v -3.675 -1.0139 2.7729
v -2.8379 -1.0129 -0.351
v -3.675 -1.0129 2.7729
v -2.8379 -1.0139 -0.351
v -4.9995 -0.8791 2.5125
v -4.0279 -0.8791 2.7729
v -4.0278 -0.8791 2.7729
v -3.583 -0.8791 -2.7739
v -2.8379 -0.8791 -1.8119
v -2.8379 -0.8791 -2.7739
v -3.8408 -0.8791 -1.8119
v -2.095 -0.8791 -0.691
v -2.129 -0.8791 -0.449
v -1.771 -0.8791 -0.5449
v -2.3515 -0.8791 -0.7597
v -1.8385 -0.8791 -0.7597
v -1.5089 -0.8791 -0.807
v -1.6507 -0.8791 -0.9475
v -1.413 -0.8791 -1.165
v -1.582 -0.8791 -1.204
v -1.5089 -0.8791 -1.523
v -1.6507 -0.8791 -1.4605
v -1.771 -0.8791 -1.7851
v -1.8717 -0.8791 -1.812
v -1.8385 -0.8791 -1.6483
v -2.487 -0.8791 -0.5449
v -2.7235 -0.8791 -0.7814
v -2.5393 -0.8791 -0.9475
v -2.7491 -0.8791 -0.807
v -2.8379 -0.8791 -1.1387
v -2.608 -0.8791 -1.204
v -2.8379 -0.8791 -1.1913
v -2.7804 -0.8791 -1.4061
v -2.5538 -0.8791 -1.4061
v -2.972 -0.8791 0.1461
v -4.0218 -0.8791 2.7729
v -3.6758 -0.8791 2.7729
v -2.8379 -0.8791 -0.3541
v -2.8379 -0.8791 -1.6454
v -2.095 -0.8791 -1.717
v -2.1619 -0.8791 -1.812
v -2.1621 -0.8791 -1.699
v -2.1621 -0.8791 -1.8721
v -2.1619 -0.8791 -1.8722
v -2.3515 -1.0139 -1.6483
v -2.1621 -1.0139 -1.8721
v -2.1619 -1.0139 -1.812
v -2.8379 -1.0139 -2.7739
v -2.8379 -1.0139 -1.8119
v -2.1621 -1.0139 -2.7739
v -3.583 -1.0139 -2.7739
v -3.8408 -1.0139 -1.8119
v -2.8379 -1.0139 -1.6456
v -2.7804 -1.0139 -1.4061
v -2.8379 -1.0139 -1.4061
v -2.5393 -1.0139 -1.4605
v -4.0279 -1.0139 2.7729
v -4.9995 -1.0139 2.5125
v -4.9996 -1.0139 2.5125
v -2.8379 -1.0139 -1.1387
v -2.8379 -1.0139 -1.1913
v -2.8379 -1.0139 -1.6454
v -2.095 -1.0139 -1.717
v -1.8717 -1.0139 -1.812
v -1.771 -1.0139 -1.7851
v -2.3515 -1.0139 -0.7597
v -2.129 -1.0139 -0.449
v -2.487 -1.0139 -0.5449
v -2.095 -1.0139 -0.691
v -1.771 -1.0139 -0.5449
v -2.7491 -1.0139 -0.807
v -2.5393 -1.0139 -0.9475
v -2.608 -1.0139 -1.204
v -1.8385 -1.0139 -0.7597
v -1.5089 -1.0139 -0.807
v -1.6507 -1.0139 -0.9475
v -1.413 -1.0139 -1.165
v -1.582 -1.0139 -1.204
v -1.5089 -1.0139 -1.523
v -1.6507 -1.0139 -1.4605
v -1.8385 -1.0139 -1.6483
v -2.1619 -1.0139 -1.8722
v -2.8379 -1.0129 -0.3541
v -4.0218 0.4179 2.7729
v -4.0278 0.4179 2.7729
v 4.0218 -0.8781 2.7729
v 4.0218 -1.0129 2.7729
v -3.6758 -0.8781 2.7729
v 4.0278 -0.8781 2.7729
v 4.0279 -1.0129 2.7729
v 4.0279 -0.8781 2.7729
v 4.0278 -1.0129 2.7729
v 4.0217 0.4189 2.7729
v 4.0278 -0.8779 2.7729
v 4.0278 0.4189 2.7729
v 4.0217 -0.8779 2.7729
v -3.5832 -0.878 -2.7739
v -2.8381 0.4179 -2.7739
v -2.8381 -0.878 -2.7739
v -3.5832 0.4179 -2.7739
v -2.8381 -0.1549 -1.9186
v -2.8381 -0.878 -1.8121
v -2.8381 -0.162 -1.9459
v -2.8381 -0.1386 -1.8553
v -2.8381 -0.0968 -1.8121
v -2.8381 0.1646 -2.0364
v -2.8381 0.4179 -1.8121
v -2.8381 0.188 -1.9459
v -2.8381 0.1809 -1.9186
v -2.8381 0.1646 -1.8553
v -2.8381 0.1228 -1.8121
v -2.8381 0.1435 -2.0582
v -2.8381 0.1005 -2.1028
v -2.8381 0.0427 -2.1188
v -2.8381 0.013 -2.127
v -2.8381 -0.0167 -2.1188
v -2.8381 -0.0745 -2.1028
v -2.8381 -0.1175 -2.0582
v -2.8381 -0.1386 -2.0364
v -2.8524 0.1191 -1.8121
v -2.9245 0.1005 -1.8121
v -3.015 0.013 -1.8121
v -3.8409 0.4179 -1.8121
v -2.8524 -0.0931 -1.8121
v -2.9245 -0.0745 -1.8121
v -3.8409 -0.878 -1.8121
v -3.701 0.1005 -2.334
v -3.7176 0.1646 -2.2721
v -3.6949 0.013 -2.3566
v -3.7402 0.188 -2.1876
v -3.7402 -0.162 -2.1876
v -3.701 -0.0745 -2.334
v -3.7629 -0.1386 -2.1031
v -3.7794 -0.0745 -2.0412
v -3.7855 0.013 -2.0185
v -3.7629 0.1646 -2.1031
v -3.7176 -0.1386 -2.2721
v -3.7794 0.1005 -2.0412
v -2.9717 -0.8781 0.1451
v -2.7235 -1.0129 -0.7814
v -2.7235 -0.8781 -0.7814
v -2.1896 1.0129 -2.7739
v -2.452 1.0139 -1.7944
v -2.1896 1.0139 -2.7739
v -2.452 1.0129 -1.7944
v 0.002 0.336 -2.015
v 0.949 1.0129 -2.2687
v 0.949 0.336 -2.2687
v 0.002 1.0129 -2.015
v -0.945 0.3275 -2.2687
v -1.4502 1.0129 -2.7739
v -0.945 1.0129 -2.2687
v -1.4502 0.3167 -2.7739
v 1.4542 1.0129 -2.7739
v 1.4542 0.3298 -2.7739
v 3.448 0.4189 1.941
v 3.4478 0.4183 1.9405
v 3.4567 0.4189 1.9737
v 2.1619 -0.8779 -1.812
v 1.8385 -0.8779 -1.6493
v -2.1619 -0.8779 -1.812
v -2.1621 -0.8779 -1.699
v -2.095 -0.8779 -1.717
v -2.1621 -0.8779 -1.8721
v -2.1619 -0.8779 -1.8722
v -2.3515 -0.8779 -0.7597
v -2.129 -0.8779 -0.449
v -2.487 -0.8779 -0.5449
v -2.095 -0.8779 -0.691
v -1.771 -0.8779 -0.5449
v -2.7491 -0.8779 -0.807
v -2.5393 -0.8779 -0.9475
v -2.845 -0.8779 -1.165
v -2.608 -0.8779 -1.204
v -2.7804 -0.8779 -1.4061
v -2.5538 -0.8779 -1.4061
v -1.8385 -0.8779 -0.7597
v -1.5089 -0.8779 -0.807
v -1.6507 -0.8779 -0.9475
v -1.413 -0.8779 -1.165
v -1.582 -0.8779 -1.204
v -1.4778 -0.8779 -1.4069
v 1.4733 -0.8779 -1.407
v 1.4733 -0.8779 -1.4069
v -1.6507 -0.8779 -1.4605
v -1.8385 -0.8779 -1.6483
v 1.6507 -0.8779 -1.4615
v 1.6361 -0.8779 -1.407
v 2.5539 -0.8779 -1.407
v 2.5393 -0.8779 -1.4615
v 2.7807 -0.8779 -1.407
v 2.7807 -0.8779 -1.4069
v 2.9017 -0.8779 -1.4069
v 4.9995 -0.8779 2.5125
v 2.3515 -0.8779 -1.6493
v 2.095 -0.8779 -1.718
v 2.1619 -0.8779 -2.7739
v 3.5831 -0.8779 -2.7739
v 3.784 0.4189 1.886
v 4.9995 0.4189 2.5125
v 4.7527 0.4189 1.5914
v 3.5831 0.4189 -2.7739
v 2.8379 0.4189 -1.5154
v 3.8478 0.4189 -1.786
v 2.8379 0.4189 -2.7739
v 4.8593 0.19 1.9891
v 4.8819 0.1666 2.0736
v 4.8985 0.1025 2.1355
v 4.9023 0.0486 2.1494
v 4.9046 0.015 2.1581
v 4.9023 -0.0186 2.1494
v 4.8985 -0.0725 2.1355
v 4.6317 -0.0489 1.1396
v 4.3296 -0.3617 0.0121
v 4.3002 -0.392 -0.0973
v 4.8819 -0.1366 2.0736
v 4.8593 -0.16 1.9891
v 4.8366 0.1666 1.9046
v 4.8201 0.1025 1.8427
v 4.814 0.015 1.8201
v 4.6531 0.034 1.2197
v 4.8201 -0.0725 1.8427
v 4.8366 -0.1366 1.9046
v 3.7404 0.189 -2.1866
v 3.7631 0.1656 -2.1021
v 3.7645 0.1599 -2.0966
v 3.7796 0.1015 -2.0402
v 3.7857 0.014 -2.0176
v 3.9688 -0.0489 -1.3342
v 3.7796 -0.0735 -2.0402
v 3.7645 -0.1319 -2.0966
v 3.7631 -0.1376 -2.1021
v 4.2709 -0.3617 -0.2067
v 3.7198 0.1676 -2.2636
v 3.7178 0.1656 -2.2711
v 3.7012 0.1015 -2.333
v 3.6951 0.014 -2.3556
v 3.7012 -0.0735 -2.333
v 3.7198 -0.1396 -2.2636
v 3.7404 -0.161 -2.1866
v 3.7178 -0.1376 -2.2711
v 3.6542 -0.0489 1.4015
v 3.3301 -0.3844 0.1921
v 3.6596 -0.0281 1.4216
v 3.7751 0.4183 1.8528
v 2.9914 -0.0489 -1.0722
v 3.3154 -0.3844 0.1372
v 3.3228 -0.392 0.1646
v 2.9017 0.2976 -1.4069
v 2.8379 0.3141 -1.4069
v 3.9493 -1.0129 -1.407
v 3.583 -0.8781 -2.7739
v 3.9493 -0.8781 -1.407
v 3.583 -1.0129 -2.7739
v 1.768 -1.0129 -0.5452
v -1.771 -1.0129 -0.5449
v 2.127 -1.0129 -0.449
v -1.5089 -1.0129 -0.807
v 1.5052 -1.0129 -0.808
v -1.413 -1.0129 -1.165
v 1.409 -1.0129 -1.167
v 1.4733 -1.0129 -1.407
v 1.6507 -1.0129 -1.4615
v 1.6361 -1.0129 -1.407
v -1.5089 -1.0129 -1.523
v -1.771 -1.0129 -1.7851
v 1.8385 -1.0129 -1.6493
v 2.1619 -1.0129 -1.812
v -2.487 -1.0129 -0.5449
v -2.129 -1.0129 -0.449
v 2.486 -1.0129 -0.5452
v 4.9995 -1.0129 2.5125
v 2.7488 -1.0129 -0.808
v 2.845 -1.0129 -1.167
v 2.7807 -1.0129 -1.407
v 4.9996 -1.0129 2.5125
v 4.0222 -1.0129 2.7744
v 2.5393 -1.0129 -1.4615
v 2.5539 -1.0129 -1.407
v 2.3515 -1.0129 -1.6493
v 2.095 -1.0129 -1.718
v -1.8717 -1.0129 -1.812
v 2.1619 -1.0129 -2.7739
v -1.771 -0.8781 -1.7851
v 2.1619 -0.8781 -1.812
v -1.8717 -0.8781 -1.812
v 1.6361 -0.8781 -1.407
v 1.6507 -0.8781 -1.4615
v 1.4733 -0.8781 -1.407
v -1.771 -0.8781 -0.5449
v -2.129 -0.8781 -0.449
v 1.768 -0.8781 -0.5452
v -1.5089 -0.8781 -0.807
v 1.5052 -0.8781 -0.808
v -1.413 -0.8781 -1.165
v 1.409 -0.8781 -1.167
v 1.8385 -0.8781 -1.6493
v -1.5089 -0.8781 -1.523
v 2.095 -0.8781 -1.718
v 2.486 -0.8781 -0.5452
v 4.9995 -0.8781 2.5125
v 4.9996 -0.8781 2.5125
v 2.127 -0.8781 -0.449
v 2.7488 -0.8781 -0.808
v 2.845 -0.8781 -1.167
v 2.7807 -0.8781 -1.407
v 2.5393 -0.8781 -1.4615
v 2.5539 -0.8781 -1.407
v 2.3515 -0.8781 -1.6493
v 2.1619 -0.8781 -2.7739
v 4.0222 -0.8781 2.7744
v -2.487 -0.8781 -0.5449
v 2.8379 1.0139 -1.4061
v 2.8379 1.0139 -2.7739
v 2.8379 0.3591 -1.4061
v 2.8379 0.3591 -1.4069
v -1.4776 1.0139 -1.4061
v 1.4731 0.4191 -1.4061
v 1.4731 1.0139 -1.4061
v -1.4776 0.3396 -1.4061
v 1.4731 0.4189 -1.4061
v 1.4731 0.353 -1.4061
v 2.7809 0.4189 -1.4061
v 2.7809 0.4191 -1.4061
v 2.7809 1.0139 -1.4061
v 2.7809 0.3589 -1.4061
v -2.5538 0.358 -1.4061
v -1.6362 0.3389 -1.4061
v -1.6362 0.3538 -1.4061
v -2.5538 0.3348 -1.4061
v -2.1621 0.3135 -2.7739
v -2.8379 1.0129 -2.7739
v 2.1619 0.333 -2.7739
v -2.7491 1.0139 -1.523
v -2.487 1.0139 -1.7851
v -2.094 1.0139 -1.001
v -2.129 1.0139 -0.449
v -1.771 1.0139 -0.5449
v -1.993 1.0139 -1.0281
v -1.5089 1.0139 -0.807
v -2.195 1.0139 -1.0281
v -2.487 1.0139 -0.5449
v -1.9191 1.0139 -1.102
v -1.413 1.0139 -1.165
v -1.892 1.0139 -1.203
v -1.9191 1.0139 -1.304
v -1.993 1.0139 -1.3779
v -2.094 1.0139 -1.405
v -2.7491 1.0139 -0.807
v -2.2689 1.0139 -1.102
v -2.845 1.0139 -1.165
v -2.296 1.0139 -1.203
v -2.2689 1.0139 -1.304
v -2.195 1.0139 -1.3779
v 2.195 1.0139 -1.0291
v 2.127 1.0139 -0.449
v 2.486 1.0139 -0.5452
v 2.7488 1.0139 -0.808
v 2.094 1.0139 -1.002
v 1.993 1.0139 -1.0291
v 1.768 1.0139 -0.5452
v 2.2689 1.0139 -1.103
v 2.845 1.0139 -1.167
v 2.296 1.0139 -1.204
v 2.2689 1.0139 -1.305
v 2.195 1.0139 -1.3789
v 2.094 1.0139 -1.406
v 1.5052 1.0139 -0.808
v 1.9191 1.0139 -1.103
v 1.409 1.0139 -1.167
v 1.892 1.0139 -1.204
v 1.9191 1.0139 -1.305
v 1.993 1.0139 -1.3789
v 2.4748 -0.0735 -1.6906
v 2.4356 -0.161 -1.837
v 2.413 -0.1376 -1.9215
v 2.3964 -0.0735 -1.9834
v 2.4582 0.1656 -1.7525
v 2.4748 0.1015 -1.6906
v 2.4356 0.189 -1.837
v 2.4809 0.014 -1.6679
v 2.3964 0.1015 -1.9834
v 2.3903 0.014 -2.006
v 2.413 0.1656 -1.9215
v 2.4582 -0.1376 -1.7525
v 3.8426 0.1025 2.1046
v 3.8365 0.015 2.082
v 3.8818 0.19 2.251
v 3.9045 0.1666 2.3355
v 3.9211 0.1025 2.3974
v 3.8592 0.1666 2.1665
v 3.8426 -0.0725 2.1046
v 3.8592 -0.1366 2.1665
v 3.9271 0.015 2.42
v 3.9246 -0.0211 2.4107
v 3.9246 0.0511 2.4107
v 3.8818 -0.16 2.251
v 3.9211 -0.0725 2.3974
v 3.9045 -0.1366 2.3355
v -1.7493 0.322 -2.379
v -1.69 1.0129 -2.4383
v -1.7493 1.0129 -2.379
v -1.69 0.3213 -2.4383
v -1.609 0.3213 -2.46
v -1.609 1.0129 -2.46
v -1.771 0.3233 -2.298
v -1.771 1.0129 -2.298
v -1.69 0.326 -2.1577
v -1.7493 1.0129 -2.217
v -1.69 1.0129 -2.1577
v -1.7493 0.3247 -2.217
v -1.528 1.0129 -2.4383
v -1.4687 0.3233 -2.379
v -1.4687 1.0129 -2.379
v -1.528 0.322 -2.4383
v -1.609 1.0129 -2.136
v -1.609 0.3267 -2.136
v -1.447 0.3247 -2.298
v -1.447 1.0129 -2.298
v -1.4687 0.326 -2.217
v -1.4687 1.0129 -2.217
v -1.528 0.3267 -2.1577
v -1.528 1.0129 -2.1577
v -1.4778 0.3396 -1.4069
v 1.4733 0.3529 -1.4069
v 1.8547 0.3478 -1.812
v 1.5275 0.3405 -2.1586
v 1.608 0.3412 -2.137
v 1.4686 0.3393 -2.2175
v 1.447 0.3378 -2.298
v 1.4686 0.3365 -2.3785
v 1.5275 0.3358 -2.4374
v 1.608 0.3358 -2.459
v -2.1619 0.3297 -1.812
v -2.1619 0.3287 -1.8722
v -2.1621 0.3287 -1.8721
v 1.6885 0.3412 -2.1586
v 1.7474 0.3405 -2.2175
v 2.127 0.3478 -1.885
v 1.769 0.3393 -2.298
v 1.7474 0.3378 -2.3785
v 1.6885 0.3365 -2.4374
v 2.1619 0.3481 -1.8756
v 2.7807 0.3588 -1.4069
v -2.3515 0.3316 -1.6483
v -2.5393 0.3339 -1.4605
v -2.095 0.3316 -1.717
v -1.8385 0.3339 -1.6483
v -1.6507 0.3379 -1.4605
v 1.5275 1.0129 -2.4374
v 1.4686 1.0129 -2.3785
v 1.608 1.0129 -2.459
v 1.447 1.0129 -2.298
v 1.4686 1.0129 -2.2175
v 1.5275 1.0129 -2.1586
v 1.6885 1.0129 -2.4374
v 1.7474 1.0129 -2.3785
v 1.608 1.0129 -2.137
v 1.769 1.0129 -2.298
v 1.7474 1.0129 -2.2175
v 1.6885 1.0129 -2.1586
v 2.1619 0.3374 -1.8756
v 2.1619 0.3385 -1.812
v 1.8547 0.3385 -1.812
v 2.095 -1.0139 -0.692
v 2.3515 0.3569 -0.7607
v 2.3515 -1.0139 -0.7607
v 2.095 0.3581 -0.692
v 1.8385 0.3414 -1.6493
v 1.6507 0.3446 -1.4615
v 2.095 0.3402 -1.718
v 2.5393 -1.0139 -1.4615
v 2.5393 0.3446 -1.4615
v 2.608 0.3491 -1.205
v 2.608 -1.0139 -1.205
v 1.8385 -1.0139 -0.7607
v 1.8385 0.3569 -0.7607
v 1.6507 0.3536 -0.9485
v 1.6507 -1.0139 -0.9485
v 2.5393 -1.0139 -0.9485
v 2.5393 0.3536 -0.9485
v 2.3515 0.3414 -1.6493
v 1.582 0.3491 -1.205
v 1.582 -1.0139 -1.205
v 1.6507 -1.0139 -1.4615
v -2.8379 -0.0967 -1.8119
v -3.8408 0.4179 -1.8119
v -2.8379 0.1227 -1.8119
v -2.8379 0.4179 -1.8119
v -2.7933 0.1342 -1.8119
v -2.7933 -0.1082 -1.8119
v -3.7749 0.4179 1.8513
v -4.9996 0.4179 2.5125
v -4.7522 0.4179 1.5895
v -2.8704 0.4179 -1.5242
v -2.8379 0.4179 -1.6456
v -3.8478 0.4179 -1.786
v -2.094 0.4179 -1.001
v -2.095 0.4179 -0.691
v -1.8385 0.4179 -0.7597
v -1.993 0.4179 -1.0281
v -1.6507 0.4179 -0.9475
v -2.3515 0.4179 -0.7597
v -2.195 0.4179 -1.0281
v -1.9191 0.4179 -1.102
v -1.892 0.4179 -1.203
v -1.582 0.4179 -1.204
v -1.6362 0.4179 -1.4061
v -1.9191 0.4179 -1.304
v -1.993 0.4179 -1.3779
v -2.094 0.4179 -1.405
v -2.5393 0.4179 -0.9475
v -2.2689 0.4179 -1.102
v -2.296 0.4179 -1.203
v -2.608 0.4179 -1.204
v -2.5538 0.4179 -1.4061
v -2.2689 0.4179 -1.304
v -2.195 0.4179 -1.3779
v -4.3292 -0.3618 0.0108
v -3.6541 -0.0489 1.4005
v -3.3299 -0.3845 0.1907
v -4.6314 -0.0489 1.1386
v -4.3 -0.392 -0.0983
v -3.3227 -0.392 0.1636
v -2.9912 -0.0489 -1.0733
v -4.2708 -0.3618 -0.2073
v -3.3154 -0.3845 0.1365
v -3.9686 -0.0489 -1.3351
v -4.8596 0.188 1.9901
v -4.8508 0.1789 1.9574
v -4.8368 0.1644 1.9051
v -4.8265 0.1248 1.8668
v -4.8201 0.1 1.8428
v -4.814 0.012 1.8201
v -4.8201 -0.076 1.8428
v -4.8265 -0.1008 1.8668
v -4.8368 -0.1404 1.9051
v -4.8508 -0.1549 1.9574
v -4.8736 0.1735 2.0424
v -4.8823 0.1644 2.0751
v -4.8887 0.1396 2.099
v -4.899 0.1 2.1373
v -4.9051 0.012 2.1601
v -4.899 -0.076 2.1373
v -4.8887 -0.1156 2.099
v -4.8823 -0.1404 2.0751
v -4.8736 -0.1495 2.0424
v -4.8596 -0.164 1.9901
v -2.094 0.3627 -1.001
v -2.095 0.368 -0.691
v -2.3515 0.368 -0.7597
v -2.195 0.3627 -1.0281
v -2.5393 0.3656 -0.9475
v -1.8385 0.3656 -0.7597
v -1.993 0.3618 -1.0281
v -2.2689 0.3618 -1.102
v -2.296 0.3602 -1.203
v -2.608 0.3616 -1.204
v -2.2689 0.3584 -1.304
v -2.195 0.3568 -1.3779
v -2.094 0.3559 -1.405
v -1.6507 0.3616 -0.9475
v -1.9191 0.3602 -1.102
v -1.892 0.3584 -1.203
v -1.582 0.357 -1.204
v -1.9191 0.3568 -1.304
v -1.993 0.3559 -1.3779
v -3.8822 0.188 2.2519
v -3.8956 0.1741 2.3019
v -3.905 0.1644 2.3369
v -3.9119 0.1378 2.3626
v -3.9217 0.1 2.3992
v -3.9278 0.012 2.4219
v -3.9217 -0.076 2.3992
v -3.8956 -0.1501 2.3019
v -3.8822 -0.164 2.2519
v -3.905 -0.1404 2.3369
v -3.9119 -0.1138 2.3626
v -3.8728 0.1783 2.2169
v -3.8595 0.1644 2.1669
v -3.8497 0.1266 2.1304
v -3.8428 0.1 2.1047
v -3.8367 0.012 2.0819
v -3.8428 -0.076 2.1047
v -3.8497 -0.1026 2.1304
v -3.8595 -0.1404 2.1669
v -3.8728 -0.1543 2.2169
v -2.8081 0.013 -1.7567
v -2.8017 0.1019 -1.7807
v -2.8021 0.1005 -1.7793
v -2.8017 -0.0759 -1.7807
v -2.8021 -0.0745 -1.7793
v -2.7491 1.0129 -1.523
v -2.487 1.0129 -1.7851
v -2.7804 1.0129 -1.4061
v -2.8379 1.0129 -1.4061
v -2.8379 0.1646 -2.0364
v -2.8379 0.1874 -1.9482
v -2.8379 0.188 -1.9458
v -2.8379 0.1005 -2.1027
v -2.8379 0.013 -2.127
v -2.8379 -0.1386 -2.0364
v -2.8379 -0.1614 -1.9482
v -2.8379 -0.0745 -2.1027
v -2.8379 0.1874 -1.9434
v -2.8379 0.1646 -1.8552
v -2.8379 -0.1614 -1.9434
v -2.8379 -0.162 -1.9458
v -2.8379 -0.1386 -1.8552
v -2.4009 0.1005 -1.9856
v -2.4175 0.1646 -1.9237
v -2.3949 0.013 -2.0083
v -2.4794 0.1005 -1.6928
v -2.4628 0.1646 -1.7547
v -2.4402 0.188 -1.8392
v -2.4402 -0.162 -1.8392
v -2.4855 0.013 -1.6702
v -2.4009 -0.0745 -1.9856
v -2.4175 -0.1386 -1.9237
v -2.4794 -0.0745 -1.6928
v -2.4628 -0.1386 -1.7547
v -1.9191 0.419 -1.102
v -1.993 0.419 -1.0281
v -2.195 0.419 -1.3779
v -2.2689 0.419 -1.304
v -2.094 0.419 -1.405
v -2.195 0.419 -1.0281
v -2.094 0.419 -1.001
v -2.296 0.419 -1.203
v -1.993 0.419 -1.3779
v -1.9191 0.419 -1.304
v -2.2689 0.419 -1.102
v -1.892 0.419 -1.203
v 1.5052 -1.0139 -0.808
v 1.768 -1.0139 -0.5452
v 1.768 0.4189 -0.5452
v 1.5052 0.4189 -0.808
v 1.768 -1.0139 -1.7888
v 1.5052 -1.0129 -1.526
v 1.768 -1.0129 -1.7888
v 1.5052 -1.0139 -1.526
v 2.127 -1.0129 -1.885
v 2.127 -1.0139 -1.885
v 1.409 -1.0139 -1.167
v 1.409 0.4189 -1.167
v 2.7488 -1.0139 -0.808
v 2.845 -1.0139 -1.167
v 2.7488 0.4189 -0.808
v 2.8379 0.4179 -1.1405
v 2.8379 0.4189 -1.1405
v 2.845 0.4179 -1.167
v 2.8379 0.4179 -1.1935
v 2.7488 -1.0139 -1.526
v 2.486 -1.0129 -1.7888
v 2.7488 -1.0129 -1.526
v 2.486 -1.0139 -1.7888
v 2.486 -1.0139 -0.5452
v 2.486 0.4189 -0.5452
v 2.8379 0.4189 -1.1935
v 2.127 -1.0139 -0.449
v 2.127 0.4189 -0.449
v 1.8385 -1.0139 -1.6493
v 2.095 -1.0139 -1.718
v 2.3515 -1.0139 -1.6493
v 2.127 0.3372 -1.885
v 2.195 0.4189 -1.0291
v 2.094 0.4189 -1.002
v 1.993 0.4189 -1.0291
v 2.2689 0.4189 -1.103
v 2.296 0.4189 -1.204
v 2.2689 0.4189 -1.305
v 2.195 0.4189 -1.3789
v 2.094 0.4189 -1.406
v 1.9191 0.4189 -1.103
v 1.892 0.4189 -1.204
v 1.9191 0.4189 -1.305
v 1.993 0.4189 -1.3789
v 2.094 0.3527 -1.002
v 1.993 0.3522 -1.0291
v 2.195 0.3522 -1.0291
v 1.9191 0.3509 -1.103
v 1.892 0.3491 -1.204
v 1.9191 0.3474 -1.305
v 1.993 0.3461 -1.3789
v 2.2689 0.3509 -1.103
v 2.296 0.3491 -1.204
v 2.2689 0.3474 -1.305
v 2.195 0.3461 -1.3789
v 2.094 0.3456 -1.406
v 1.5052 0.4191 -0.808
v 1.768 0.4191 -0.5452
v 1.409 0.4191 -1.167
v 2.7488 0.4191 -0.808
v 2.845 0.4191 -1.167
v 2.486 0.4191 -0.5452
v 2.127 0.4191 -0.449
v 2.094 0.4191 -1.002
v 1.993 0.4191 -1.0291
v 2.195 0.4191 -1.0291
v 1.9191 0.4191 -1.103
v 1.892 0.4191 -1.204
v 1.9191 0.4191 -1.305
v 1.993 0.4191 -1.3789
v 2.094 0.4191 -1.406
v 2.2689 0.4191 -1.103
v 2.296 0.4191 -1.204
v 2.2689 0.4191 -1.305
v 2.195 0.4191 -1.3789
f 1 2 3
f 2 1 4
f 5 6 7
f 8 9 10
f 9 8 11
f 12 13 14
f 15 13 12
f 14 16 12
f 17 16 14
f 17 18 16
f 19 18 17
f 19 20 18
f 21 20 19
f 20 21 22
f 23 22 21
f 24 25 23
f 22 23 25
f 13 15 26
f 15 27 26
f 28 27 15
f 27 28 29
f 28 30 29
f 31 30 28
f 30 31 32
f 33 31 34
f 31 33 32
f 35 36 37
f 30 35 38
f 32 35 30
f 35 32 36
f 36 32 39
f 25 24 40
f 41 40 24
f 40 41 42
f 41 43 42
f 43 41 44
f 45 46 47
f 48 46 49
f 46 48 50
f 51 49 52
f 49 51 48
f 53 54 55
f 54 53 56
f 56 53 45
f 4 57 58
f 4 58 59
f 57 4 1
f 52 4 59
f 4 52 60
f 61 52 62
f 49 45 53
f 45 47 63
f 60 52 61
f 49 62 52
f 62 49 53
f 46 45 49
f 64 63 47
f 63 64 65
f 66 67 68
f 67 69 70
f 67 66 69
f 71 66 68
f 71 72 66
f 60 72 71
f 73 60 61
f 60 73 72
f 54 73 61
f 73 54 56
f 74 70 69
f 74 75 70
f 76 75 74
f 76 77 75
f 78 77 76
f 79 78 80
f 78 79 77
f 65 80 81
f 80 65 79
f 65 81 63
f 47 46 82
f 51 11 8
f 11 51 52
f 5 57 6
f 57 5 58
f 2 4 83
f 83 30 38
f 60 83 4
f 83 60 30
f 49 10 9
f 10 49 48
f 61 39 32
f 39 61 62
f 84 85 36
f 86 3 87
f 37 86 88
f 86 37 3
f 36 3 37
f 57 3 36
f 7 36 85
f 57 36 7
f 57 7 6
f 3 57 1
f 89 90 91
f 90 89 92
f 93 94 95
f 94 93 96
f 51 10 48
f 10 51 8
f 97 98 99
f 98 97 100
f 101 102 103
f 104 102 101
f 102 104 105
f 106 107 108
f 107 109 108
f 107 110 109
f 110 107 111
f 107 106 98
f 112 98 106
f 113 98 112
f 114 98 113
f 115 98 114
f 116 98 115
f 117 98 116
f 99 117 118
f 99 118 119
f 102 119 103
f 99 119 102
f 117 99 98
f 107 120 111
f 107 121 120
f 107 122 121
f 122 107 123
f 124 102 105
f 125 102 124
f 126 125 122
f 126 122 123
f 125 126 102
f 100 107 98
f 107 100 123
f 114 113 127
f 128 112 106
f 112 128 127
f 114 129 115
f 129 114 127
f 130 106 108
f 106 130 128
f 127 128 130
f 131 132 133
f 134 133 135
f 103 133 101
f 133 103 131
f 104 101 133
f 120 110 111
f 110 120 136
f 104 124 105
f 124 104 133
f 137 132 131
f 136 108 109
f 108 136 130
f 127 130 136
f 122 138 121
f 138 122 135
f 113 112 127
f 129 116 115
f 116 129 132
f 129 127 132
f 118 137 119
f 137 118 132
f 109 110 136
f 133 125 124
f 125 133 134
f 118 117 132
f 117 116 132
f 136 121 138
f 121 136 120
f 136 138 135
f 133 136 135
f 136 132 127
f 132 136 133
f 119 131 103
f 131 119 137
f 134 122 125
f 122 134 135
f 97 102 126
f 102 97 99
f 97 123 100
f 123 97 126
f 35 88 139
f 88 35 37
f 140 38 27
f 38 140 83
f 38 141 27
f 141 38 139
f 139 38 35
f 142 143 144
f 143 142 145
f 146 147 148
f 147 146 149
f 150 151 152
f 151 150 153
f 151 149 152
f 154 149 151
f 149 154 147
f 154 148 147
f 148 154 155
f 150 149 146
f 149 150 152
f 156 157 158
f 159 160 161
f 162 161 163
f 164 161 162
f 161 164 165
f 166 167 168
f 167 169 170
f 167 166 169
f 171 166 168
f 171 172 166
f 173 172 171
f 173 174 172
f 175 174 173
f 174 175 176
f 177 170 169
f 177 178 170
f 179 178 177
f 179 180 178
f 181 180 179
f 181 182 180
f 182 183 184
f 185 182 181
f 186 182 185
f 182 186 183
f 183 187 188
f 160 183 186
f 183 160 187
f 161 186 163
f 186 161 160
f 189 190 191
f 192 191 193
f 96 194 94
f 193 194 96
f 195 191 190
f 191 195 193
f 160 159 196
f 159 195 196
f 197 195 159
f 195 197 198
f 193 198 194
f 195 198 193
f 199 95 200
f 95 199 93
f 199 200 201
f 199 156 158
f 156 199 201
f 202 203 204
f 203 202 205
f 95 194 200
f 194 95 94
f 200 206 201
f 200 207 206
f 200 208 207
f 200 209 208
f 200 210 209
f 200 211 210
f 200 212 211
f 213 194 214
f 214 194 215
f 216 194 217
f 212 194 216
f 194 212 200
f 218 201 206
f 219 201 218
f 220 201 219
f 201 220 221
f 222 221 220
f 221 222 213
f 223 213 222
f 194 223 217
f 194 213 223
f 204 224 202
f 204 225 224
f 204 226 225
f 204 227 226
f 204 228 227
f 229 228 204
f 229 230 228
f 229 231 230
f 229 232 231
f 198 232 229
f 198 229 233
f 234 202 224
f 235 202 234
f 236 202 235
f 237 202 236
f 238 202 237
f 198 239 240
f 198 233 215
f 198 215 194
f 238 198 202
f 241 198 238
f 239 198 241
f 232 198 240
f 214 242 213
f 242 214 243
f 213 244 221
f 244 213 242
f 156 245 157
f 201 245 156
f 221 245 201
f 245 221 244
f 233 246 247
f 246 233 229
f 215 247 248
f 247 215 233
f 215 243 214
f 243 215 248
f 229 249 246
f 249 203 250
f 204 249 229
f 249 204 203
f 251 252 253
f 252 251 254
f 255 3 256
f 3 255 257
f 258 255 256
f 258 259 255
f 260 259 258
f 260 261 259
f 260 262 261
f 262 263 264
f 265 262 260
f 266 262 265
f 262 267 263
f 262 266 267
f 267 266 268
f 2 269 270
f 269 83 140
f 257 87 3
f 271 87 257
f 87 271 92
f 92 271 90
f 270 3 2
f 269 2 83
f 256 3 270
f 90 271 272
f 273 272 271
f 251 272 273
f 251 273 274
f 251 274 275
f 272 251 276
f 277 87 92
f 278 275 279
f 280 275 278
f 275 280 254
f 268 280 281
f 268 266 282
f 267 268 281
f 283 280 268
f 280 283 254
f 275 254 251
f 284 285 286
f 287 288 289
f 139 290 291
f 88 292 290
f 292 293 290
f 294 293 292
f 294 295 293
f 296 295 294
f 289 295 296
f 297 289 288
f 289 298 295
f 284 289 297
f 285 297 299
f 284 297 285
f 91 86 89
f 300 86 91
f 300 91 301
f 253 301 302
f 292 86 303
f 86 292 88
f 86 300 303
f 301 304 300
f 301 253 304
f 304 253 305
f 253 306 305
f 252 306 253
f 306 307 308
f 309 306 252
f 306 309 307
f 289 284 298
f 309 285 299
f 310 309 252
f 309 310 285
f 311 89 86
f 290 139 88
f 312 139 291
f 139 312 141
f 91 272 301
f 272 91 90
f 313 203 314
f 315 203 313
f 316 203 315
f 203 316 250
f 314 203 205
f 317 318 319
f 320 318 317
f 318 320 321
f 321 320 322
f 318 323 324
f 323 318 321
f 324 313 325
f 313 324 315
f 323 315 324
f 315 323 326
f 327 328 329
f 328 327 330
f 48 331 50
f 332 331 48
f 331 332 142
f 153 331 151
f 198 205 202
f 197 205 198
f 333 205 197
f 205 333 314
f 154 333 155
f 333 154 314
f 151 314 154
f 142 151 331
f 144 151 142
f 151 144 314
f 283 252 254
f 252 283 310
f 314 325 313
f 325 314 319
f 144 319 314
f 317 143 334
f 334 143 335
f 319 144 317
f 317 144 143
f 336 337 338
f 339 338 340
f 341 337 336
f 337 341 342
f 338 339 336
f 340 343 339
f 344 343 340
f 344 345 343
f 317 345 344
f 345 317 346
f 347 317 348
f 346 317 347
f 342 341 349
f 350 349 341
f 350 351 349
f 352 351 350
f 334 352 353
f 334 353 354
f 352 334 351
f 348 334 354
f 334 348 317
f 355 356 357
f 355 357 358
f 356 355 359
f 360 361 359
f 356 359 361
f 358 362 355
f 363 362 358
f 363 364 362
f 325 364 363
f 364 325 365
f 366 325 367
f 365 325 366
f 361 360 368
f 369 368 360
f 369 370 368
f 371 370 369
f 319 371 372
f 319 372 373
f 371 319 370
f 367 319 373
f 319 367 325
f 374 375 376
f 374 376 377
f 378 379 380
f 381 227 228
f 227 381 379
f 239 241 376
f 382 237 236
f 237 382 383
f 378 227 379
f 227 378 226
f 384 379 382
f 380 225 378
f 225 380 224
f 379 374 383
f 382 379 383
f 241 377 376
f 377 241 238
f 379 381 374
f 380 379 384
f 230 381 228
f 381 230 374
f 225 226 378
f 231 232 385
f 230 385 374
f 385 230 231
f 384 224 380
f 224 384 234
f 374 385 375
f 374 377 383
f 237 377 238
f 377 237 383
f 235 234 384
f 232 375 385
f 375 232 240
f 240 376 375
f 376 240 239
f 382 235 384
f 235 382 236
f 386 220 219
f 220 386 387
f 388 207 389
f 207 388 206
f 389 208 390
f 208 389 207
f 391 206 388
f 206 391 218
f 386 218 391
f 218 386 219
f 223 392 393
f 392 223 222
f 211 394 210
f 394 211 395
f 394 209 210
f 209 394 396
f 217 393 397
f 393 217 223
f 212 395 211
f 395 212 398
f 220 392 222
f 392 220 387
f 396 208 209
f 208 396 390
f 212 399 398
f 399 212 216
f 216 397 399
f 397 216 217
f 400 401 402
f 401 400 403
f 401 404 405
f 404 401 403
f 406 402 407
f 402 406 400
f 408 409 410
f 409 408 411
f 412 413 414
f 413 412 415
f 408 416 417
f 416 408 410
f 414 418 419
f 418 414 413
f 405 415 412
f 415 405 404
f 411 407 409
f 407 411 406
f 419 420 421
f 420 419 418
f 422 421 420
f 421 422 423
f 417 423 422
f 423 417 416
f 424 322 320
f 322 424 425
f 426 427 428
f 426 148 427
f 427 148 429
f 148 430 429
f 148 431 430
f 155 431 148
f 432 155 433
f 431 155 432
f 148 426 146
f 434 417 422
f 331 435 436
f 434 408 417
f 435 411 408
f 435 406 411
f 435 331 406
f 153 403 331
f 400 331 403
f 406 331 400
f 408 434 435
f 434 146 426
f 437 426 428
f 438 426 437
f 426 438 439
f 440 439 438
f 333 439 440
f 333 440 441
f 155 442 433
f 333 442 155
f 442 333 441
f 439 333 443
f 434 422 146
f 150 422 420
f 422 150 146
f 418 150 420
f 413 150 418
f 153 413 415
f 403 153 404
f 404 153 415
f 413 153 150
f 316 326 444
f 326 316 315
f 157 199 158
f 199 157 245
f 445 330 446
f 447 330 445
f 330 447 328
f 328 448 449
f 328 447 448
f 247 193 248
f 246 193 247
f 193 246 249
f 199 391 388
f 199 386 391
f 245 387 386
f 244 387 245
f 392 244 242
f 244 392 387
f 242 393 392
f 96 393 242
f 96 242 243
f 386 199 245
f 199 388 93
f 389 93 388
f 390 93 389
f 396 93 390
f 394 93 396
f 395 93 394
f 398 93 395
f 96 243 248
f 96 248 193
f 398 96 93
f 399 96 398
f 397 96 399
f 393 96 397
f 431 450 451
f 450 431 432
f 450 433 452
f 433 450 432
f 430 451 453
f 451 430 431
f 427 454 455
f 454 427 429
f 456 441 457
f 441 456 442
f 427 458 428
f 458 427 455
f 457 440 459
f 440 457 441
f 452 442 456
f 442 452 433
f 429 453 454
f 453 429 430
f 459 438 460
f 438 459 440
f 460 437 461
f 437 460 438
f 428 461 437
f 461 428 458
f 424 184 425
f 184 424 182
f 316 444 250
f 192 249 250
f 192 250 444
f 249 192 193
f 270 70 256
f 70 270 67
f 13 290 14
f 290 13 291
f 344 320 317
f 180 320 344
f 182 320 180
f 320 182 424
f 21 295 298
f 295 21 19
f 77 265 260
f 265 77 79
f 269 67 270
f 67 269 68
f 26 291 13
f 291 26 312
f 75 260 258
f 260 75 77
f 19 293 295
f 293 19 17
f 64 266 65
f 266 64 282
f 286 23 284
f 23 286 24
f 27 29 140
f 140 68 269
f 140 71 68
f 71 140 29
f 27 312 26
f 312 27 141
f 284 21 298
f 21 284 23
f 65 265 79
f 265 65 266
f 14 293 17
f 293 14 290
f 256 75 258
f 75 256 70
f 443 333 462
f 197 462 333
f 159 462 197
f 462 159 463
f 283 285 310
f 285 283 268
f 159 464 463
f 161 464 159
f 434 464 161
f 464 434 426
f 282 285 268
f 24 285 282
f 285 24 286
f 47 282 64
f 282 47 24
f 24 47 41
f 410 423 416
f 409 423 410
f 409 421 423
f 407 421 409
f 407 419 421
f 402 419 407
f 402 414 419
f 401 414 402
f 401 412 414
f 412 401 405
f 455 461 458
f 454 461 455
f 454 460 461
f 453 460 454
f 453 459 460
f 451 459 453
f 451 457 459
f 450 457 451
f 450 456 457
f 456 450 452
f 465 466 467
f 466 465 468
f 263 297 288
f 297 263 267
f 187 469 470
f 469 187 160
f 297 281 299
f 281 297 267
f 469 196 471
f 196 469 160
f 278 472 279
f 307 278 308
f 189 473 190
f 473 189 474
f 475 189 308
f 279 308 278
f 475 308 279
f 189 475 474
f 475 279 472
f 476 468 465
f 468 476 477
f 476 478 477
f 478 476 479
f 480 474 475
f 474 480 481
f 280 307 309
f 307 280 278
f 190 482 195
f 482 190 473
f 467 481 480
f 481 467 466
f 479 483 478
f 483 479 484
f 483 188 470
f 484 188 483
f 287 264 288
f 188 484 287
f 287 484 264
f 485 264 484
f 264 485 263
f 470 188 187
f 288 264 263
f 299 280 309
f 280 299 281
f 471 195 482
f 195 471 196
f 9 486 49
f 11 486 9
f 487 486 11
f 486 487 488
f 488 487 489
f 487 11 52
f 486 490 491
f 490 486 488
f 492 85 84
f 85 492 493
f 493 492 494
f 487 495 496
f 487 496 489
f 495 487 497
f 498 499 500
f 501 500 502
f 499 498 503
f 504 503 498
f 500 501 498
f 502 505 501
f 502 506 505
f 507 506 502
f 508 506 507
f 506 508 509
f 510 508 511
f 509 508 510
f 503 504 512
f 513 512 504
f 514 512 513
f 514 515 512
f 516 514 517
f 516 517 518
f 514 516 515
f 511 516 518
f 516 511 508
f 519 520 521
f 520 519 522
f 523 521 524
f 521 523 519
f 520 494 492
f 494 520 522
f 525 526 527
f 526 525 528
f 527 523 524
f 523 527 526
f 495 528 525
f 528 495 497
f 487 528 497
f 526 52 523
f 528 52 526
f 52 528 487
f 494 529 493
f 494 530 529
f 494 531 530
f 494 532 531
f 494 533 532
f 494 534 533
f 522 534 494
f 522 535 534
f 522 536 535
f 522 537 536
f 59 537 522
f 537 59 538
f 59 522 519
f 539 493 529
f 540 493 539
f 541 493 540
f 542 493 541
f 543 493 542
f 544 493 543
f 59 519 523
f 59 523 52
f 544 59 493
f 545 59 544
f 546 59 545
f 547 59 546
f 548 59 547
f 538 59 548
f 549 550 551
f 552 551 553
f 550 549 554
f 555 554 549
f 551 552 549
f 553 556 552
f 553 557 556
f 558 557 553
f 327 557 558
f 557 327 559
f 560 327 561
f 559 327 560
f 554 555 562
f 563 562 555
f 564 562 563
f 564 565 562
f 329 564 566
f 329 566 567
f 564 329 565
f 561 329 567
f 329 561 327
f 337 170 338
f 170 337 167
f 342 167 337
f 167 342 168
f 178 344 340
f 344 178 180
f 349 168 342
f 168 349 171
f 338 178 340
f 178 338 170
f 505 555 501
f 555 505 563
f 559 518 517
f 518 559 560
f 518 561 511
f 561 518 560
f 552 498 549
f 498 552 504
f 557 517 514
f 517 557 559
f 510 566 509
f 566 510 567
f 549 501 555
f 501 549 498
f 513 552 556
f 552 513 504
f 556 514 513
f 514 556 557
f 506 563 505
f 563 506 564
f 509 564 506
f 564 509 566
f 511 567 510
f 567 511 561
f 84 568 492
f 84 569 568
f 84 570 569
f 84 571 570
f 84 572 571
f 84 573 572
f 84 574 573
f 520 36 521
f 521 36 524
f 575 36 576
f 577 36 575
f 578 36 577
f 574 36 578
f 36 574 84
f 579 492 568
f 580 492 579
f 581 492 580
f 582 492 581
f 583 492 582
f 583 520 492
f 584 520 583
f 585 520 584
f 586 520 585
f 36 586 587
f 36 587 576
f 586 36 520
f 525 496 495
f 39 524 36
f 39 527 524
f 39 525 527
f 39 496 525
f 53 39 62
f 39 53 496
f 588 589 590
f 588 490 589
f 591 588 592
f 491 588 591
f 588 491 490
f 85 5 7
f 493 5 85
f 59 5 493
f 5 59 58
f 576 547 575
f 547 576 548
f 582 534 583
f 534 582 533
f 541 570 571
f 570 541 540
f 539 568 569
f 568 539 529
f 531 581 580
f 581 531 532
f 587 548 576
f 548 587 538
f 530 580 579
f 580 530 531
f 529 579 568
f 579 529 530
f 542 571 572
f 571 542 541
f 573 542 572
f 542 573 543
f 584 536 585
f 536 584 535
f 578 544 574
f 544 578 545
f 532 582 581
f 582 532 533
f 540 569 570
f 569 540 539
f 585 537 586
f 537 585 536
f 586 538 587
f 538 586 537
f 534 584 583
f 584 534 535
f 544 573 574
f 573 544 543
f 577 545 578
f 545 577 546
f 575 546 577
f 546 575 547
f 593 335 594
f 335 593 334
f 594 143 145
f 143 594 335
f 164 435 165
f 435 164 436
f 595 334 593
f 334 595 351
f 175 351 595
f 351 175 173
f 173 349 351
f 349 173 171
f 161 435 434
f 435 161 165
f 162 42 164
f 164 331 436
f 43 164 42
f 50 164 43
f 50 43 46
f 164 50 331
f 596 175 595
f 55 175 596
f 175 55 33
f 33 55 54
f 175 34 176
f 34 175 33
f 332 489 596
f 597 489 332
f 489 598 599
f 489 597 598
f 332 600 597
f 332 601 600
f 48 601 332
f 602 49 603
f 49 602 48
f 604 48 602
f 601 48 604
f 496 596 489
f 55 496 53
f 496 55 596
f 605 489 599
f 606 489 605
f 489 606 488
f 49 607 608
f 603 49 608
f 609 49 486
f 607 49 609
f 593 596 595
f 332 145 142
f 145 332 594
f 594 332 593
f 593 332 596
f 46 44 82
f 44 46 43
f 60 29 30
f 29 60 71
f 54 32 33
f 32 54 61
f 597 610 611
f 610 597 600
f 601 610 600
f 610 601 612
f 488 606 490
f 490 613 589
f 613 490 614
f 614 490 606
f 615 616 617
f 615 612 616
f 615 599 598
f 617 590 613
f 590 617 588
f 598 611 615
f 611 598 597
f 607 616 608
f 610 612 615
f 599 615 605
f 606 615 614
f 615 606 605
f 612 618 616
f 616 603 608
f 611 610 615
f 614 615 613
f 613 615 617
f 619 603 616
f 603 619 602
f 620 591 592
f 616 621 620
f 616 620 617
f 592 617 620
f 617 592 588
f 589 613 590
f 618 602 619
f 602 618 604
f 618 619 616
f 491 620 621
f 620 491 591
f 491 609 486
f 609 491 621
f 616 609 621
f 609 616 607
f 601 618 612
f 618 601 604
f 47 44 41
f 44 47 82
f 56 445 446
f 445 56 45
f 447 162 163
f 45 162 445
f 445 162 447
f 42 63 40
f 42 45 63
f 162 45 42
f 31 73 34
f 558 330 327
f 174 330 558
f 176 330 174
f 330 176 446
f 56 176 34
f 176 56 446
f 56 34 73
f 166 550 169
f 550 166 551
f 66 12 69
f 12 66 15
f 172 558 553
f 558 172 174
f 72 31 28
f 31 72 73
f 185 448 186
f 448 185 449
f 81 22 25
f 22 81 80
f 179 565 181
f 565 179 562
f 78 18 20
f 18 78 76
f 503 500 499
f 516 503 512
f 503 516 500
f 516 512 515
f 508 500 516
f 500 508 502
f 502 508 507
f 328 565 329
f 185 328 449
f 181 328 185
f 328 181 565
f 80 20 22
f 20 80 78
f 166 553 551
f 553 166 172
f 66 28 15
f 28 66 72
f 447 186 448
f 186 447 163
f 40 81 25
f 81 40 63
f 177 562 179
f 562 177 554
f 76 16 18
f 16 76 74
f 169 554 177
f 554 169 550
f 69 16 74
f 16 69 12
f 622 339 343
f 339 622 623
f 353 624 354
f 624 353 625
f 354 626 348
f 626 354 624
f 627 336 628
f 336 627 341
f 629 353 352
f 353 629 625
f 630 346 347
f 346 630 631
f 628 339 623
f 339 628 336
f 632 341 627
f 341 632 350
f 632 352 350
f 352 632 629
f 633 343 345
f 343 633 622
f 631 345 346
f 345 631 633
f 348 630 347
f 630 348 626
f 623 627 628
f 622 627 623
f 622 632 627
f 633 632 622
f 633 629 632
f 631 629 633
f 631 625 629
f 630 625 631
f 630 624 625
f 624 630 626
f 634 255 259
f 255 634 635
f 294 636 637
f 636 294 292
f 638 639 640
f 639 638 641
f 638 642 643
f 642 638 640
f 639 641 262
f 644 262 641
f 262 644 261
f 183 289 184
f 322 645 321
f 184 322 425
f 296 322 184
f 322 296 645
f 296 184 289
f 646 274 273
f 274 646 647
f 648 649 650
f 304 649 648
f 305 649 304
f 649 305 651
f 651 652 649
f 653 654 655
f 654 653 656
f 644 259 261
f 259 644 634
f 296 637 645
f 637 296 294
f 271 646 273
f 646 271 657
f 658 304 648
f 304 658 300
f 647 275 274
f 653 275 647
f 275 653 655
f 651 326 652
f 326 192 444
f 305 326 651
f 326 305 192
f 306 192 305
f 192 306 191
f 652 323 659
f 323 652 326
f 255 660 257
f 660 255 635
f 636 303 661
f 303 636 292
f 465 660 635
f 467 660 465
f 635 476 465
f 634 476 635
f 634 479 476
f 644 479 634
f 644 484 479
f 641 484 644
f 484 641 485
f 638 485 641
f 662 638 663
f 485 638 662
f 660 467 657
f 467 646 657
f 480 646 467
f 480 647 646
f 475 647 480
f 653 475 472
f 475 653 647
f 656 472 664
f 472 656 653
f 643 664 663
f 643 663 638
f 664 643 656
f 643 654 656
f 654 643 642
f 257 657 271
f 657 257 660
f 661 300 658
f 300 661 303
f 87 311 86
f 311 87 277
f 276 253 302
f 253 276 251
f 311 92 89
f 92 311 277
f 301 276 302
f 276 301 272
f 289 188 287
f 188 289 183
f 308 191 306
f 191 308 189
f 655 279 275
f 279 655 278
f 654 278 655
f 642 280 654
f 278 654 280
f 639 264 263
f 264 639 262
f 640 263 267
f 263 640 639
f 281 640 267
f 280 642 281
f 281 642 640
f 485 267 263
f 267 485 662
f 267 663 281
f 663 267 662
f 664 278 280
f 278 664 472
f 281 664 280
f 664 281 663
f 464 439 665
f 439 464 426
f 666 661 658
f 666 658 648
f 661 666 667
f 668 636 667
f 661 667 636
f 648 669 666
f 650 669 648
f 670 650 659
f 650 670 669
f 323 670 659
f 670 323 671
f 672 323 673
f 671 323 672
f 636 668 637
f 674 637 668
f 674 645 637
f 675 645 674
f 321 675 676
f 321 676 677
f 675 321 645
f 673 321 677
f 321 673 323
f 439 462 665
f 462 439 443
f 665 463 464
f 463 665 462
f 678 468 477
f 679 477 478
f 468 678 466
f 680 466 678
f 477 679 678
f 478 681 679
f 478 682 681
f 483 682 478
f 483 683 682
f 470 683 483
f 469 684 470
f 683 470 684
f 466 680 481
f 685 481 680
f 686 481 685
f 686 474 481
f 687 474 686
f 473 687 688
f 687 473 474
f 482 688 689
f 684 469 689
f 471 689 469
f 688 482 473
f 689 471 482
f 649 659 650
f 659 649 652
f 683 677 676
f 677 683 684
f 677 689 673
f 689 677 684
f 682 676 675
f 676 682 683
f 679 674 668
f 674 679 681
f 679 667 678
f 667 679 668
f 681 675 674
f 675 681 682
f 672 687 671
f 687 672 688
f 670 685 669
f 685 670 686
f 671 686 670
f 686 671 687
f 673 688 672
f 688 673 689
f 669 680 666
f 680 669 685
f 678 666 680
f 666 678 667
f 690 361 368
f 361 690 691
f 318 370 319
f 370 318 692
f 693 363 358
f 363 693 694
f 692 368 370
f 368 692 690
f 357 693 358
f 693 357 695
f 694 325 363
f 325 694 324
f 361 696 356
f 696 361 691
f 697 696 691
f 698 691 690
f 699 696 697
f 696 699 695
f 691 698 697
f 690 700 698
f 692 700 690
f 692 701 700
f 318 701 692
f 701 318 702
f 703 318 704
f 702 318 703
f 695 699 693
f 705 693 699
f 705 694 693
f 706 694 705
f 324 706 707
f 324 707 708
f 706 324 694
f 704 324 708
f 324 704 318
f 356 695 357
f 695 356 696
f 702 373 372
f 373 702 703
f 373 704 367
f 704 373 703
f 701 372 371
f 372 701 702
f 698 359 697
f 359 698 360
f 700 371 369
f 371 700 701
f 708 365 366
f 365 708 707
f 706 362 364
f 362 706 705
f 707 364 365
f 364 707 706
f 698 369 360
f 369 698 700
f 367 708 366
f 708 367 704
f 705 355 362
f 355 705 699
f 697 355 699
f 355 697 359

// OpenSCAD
intersection() {
  cube(size = [11.9998, 2.4318, 6.6578], center = true);

  union() {
    intersection() {
      union() {
        intersection() {
          difference() {
            translate([-1.52527, -0.9465, -7.85181])
            rotate([-90, -15, 0])
            cube(size = [1.3468, 21.8208, 0.1348], center = true);
          
            translate([-2.5, -8.86365, 0.154716])
            rotate([179, 0, 0])
            cube(size = [0.6759, 18.4699, 36.1999], center = true);
          }
        
          union() {
            translate([7.969, 8.544, -9.956])
            cube(size = [20.2618, 19.1138, 16.2878], center = true);
          
            translate([-10.131, -8.543, -0.0005])
            cube(size = [15.9378, 19.1138, 5.5468], center = true);
          }
        }
      
        difference() {
          difference() {
            translate([-10.469, -0.298, -2.293])
            cube(size = [15.2618, 1.4318, 0.9618], center = true);
          
            translate([-3.08971, 0.013, -2.01328])
            rotate([0, 75, 0])
            cylinder(h = 1.3469, r1 = 0.175, r2 = 0.175, center = true, $fn = 12);
          }
        
          difference() {
            translate([0, -0.298, -0.0005])
            cube(size = [36.1999, 1.4319, 5.5469], center = true);
          
            translate([-1.52527, -0.2295, -7.85181])
            rotate([-90, -15, 0])
            cube(size = [1.347, 21.821, 1.297], center = true);
          }
        }
      }
    
      translate([0, 0, -0.0005])
      cube(size = [36.1998, 36.1998, 5.5468], center = true);
    }
  
    difference() {
      intersection() {
        difference() {
          translate([7.37339, 0, 1.9757])
          rotate([-91, -15, 0])
          cube(size = [20.9328, 36.1998, 36.1998], center = true);
        
          translate([0.002, -0.0005, -3.909])
          rotate([180, 90, -90])
          cylinder(h = 2.0269, r1 = 1.894, r2 = 1.894, center = true, $fn = 12);
        }
      
        union() {
          translate([-8.58411, -0.9455, -5.14301])
          rotate([90, 15, 0])
          cube(size = [22.2788, 21.8208, 0.1348], center = true);
        
          translate([-7.631, 0.068, -2.09])
          cube(size = [20.9378, 1.8918, 1.3678], center = true);
        
          difference() {
            translate([1.52334, -0.2295, -7.8513])
            rotate([90, 15, 0])
            cube(size = [1.3508, 21.8208, 1.2968], center = true);
          
            translate([10.3712, 2.169, -1.724])
            rotate([180, 75, 180])
            cylinder(h = 15.2719, r1 = 2.561, r2 = 2.561, center = true, $fn = 12);
          }
        }
      
        difference() {
          translate([0, 0, -0.0005])
          cube(size = [36.1998, 36.1998, 5.5468], center = true);
        
          translate([9.81136, 0.014, -3.8133])
          rotate([180, 75, 180])
          cylinder(h = 15.2719, r1 = 0.175, r2 = 0.175, center = true, $fn = 12);
        }
      }
    
      intersection() {
        union() {
          translate([0.822786, 0.015, 3.07068])
          rotate([180, 75, 180])
          cylinder(h = 36.1999, r1 = 0.175, r2 = 0.175, center = true, $fn = 12);
        
          translate([-1.609, 8.611, -2.298])
          rotate([180, 90, -90])
          cylinder(h = 18.9779, r1 = 0.162, r2 = 0.162, center = true, $fn = 12);
        
          translate([-7.17204, -8.86365, 2.08192])
          rotate([89, 15, 0])
          cube(size = [21.2669, 36.1999, 18.4699], center = true);
        
          translate([1.608, 8.611, -2.298])
          rotate([180, 90, -90])
          cylinder(h = 18.9779, r1 = 0.161, r2 = 0.161, center = true, $fn = 12);
        }
      
        union() {
          translate([0, 0.068, 0.683])
          cube(size = [36.1999, 1.8919, 4.1799], center = true);
        
          translate([-2.129, 0, -1.165])
          rotate([180, 90, -90])
          cylinder(h = 36.1999, r1 = 0.716, r2 = 0.716, center = true, $fn = 12);
        
          translate([-7.969, -0.0005, -2.293])
          cube(size = [20.2619, 2.0269, 0.9619], center = true);
        
          translate([2.095, -8.543, -1.205])
          rotate([180, 90, -90])
          cylinder(h = 19.1139, r1 = 0.513, r2 = 0.513, center = true, $fn = 12);
        }
      }
    }
  
    intersection() {
      difference() {
        translate([0, -0.298, 0.4805])
        cube(size = [36.1998, 1.4318, 4.5848], center = true);
      
        translate([-10.3733, 2.169, -1.72562])
        rotate([0, 75, 0])
        cylinder(h = 15.2669, r1 = 2.561, r2 = 2.561, center = true, $fn = 12);
      }
    
      union() {
        translate([-3.54785, -0.298, -0.950642])
        rotate([-90, -15, 0])
        cube(size = [1.0118, 36.1998, 1.4318], center = true);
      
        translate([7.41511, 9.23359, 1.82001])
        rotate([-91, -15, 0])
        cube(size = [20.9328, 36.1998, 17.7298], center = true);
      }
    
      union() {
        difference() {
          translate([-2.129, 8.611, -1.165])
          rotate([180, 90, -90])
          cylinder(h = 18.9778, r1 = 0.716, r2 = 0.716, center = true, $fn = 12);
        
          translate([-2.094, -8.8405, -1.203])
          rotate([180, 90, -90])
          cylinder(h = 18.5189, r1 = 0.202, r2 = 0.202, center = true, $fn = 12);
        }
      
        difference() {
          translate([-1.68707, -0.298, -7.89517])
          rotate([-90, -15, 0])
          cube(size = [1.0118, 21.8208, 1.4318], center = true);
        
          translate([-0.823045, 0.012, 3.07164])
          rotate([0, 75, 0])
          cylinder(h = 36.1999, r1 = 0.176, r2 = 0.176, center = true, $fn = 12);
        }
      }
    }
  
    difference() {
      union() {
        translate([-2.5, -0.0005, -2.09])
        cube(size = [0.6758, 2.0268, 1.3678], center = true);
      
        translate([-2.129, -0.9465, -1.165])
        rotate([180, 90, -90])
        cylinder(h = 0.1348, r1 = 0.716, r2 = 0.716, center = true, $fn = 12);
      
        difference() {
          translate([-2.129, 0.068, -1.165])
          rotate([180, 90, -90])
          cylinder(h = 1.8918, r1 = 0.716, r2 = 0.716, center = true, $fn = 12);
        
          translate([7.969, -0.2295, -2.293])
          cube(size = [20.2619, 1.2969, 0.9619], center = true);
        }
      }
    
      union() {
        translate([-9.81351, 0.013, -3.81491])
        rotate([0, 75, 0])
        cylinder(h = 15.2669, r1 = 0.175, r2 = 0.175, center = true, $fn = 12);
      
        translate([7.969, -0.9465, -2.293])
        cube(size = [20.2619, 0.1349, 0.9619], center = true);
      
        translate([-2.095, -0.298, -1.204])
        rotate([180, 90, -90])
        cylinder(h = 1.4319, r1 = 0.513, r2 = 0.513, center = true, $fn = 12);
      
        translate([-2.094, 0.7165, -1.203])
        rotate([180, 90, -90])
        cylinder(h = 0.5949, r1 = 0.202, r2 = 0.202, center = true, $fn = 12);
      }
    }
  
    difference() {
      union() {
        translate([2.127, -0.298, -1.167])
        rotate([180, 90, -90])
        cylinder(h = 1.4318, r1 = 0.718, r2 = 0.718, center = true, $fn = 12);
      
        translate([1.68707, -0.9455, -7.89517])
        rotate([90, 15, 0])
        cube(size = [1.0118, 21.8208, 0.1348], center = true);
      }
    
      union() {
        translate([0, 8.544, -9.7535])
        cube(size = [36.1999, 19.1139, 16.6929], center = true);
      
        translate([2.095, -0.298, -1.205])
        rotate([180, 90, -90])
        cylinder(h = 1.4319, r1 = 0.513, r2 = 0.513, center = true, $fn = 12);
      }
    }
  
    difference() {
      intersection() {
        translate([2.127, -0.2295, -1.167])
        rotate([180, 90, -90])
        cylinder(h = 1.2968, r1 = 0.718, r2 = 0.718, center = true, $fn = 12);
      
        translate([0, 9.23359, -0.161173])
        rotate([179, 0, 0])
        cube(size = [36.1998, 17.7298, 36.1998], center = true);
      
        translate([-7.631, 9.23359, -0.161173])
        rotate([179, 0, 0])
        cube(size = [20.9378, 17.7298, 36.1998], center = true);
      }
    
      difference() {
        intersection() {
          translate([2.095, -8.543, -1.205])
          rotate([180, 90, -90])
          cylinder(h = 19.1139, r1 = 0.513, r2 = 0.513, center = true, $fn = 12);
        
          translate([2.094, 8.611, -1.204])
          rotate([180, 90, -90])
          cylinder(h = 18.9779, r1 = 0.202, r2 = 0.202, center = true, $fn = 12);
        }
      
        translate([2.5, 0.068, -10.437])
        cube(size = [0.676, 1.892, 15.326], center = true);
      }
    }
  
    difference() {
      union() {
        translate([2.127, 0.7165, -1.167])
        rotate([180, 90, -90])
        cylinder(h = 0.5948, r1 = 0.718, r2 = 0.718, center = true, $fn = 12);
      
        translate([2.5, 0.7165, -2.09])
        cube(size = [0.6758, 0.5948, 1.3678], center = true);
      }
    
      union() {
        translate([2.5, -0.2295, -1.6095])
        cube(size = [0.6759, 1.2969, 0.4049], center = true);
      
        translate([2.094, 0.7165, -1.204])
        rotate([180, 90, -90])
        cylinder(h = 0.5949, r1 = 0.202, r2 = 0.202, center = true, $fn = 12);
      }
    }
  }
}
